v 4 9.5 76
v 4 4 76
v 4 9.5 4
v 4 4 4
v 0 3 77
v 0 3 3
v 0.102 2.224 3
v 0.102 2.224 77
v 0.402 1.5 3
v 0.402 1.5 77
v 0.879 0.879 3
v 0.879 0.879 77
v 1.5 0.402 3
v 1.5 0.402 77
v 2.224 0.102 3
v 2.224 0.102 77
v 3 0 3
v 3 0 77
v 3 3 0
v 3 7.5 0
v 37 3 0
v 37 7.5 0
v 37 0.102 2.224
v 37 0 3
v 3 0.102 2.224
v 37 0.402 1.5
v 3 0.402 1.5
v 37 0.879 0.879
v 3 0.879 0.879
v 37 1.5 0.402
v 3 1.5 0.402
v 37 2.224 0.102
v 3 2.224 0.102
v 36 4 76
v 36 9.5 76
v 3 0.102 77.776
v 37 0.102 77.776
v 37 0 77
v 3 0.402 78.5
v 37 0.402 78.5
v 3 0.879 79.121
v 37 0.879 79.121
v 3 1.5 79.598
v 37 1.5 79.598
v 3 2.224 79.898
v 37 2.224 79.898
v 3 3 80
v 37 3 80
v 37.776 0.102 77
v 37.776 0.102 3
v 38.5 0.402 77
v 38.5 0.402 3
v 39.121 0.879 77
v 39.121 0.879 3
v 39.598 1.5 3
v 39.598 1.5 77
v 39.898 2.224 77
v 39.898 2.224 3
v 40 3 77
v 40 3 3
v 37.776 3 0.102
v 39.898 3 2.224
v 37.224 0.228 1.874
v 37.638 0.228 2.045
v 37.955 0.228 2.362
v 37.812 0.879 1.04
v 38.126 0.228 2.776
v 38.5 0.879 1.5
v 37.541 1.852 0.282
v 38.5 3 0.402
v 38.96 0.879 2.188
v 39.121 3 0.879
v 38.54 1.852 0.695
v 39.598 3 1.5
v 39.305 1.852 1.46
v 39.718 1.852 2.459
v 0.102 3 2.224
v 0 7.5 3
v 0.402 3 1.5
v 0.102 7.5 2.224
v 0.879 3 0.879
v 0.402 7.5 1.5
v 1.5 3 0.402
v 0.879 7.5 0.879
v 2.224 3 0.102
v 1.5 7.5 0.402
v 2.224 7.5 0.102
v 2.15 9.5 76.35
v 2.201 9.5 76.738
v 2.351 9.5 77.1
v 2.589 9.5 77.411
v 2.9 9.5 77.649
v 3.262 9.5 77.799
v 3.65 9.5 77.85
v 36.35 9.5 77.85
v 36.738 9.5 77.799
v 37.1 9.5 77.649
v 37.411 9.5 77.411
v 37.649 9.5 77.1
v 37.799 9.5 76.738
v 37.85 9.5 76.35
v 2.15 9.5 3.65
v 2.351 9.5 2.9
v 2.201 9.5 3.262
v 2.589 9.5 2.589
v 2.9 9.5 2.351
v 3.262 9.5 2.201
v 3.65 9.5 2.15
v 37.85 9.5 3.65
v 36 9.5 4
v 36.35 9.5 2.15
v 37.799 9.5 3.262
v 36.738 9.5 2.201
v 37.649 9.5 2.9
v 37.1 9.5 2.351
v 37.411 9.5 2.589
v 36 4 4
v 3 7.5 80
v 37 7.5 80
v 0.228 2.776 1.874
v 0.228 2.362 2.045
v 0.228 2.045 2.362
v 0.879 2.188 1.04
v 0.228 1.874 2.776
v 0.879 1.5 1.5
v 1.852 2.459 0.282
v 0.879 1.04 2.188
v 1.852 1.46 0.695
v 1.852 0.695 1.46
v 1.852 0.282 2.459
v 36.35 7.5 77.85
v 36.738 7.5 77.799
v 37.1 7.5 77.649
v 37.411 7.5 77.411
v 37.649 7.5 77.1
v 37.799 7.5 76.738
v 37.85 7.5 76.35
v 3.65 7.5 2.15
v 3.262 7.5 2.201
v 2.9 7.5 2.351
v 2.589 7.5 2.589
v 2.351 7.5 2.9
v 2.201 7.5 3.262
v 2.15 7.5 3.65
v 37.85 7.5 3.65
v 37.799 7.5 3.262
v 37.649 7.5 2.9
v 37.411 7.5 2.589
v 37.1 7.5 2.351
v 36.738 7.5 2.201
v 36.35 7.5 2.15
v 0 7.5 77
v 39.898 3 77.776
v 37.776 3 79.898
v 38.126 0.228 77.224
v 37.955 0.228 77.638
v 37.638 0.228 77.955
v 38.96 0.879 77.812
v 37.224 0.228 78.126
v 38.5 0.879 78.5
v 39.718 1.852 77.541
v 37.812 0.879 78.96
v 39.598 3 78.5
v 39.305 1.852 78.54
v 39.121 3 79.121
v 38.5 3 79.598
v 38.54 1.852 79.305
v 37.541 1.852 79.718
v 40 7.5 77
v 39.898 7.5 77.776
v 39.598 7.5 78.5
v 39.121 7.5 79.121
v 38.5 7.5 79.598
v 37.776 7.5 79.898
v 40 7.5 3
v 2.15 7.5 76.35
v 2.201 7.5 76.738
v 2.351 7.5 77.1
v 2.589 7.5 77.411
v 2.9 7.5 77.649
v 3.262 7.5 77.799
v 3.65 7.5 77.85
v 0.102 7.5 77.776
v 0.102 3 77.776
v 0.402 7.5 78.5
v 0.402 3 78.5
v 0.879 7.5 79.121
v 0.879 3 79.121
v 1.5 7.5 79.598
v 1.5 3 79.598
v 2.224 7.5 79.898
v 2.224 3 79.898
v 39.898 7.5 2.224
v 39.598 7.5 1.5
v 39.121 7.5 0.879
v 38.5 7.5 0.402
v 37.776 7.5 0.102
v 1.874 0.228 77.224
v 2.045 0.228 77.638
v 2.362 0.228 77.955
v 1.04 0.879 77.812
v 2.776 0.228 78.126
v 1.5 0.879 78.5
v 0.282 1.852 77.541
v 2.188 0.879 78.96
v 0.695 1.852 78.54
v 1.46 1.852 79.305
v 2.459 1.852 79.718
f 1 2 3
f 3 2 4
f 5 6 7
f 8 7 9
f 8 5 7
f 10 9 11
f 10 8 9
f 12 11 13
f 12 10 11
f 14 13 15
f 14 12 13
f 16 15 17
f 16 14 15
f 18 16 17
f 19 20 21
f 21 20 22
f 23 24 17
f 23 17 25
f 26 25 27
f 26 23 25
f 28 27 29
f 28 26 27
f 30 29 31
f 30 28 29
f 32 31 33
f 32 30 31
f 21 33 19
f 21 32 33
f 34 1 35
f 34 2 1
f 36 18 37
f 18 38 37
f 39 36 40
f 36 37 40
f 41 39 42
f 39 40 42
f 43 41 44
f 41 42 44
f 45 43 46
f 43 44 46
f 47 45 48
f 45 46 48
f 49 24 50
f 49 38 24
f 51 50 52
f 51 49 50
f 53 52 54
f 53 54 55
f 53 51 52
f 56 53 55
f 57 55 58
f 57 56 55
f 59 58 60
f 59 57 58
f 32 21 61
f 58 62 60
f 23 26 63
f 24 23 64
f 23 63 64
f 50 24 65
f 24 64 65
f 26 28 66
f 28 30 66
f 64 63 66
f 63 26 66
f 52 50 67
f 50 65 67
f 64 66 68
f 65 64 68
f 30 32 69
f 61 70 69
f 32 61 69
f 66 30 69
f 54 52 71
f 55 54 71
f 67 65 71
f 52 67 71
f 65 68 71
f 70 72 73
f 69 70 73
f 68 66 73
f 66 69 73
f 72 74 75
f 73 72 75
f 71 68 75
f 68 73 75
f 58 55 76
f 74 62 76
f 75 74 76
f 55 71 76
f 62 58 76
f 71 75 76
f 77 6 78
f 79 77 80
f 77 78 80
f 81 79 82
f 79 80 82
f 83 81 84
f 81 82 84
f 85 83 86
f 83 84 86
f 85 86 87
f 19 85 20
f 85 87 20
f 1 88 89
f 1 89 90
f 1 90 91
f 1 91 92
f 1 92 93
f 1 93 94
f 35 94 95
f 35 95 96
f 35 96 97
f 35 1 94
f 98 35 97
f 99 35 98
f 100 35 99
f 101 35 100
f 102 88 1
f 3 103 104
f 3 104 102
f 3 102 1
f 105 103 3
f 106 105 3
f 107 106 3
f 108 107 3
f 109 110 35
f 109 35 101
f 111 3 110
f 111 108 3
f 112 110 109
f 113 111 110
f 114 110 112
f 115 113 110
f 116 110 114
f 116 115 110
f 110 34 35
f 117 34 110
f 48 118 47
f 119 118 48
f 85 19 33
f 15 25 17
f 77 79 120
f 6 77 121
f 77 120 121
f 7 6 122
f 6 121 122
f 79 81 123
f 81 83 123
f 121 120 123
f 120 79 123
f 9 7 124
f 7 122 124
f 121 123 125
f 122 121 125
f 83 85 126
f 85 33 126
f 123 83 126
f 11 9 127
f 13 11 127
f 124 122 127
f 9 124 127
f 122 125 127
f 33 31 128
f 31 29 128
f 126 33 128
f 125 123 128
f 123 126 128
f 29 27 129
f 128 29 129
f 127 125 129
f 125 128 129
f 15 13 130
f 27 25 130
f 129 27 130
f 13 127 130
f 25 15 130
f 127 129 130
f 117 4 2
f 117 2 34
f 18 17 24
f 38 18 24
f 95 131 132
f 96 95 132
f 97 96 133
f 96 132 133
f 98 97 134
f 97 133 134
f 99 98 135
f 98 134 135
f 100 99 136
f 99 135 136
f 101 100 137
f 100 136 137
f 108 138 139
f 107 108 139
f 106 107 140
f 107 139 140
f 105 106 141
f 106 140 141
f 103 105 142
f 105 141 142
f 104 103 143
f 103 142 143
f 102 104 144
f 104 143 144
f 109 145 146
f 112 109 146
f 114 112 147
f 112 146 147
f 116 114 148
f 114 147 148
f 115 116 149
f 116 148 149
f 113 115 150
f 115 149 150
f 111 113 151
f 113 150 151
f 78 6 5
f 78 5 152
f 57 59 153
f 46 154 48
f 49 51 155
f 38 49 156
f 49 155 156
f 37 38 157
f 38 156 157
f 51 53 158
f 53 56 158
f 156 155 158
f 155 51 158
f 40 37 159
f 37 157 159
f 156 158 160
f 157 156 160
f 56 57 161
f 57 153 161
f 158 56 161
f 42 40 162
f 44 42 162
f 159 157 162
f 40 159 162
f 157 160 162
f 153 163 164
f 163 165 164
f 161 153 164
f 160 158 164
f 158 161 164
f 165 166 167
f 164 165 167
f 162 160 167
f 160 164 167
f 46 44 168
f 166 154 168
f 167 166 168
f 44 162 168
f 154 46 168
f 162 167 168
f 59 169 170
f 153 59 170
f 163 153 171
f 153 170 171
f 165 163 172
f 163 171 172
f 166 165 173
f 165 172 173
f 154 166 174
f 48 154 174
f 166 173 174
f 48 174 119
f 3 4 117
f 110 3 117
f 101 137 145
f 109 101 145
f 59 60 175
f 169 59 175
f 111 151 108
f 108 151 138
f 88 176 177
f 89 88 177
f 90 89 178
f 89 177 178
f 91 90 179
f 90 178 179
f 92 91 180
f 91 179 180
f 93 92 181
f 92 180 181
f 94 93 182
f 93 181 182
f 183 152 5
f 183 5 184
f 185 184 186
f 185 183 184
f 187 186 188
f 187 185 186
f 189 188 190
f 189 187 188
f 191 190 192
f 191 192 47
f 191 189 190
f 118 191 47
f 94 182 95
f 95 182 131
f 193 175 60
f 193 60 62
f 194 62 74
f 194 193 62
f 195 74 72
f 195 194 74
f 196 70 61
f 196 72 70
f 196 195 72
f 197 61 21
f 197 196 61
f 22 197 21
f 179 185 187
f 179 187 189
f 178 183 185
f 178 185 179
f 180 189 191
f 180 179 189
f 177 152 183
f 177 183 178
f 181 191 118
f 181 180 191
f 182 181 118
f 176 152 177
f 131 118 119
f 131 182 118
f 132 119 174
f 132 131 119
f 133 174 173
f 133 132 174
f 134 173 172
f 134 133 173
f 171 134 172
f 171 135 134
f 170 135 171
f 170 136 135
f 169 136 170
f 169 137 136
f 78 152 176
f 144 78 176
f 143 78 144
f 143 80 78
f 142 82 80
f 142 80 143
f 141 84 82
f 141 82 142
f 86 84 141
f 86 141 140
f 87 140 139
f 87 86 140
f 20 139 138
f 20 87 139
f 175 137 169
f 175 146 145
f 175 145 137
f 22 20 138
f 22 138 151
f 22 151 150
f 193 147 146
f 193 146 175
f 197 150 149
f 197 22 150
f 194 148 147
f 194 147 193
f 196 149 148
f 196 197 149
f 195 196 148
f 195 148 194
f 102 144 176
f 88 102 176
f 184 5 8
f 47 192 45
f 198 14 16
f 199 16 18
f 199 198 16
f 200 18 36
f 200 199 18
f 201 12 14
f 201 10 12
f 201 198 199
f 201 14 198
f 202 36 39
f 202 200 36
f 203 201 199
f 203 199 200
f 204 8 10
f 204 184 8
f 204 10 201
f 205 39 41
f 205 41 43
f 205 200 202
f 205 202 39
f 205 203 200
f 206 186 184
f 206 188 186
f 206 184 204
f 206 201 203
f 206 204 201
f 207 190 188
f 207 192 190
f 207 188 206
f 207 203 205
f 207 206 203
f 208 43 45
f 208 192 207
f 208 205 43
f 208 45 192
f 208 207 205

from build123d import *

# Parameters (mm, degrees)
SKETCH1_W           = 40
SKETCH1_H           = 7.5
BOSS_EXTRUDE1_DEPTH = 80
SHELL1_T            = -4
FILLET1_R           = 3
SKETCH2_W           = 32
SKETCH2_H           = 72
BOSS_EXTRUDE2_DEPTH = 2


with BuildPart() as part:
    # Sketch1 → Boss-Extrude1 (new body)
    with BuildSketch(Plane.XY):
        with Locations((20, 3.75)):
            Rectangle(SKETCH1_W, SKETCH1_H)
    extrude(amount=BOSS_EXTRUDE1_DEPTH)

    # Shell1
    shell1_openings = [part.faces().sort_by_distance(p)[0] for p in [
        (20, 7.5, 40),
    ]]
    offset(amount=SHELL1_T, openings=shell1_openings, kind=Kind.INTERSECTION)

    # Fillet1
    fillet1_edges = [part.edges().sort_by_distance(p)[0] for p in [
        (40, 3.75, 80),
        (0, 3.75, 80),
        (40, 3.75, 0),
        (20, 0, 0),
        (0, 3.75, 0),
        (40, 0, 40),
        (0, 0, 40),
        (20, 0, 80),
    ]]
    fillet(fillet1_edges, radius=FILLET1_R)

    # Sketch2 → Boss-Extrude2 (add)
    with BuildSketch(Plane(origin=(0, 7.5, 0), x_dir=(1, 0, 0), z_dir=(0, 1, 0))):
        with BuildLine():
            Line((3.65, -77.85), (36.35, -77.85))
            ThreePointArc((36.35, -77.85), (37.410660172, -77.410660172), (37.85, -76.35))
            Line((37.85, -76.35), (37.85, -3.65))
            ThreePointArc((37.85, -3.65), (37.410660172, -2.589339828), (36.35, -2.15))
            Line((36.35, -2.15), (3.65, -2.15))
            ThreePointArc((3.65, -2.15), (2.589339828, -2.589339828), (2.15, -3.65))
            Line((2.15, -3.65), (2.15, -76.35))
            ThreePointArc((2.15, -76.35), (2.589339828, -77.410660172), (3.65, -77.85))
        make_face()
        with Locations((20, -40)):
            Rectangle(SKETCH2_W, SKETCH2_H, mode=Mode.SUBTRACT)
    extrude(amount=BOSS_EXTRUDE2_DEPTH)


solid = part.part
